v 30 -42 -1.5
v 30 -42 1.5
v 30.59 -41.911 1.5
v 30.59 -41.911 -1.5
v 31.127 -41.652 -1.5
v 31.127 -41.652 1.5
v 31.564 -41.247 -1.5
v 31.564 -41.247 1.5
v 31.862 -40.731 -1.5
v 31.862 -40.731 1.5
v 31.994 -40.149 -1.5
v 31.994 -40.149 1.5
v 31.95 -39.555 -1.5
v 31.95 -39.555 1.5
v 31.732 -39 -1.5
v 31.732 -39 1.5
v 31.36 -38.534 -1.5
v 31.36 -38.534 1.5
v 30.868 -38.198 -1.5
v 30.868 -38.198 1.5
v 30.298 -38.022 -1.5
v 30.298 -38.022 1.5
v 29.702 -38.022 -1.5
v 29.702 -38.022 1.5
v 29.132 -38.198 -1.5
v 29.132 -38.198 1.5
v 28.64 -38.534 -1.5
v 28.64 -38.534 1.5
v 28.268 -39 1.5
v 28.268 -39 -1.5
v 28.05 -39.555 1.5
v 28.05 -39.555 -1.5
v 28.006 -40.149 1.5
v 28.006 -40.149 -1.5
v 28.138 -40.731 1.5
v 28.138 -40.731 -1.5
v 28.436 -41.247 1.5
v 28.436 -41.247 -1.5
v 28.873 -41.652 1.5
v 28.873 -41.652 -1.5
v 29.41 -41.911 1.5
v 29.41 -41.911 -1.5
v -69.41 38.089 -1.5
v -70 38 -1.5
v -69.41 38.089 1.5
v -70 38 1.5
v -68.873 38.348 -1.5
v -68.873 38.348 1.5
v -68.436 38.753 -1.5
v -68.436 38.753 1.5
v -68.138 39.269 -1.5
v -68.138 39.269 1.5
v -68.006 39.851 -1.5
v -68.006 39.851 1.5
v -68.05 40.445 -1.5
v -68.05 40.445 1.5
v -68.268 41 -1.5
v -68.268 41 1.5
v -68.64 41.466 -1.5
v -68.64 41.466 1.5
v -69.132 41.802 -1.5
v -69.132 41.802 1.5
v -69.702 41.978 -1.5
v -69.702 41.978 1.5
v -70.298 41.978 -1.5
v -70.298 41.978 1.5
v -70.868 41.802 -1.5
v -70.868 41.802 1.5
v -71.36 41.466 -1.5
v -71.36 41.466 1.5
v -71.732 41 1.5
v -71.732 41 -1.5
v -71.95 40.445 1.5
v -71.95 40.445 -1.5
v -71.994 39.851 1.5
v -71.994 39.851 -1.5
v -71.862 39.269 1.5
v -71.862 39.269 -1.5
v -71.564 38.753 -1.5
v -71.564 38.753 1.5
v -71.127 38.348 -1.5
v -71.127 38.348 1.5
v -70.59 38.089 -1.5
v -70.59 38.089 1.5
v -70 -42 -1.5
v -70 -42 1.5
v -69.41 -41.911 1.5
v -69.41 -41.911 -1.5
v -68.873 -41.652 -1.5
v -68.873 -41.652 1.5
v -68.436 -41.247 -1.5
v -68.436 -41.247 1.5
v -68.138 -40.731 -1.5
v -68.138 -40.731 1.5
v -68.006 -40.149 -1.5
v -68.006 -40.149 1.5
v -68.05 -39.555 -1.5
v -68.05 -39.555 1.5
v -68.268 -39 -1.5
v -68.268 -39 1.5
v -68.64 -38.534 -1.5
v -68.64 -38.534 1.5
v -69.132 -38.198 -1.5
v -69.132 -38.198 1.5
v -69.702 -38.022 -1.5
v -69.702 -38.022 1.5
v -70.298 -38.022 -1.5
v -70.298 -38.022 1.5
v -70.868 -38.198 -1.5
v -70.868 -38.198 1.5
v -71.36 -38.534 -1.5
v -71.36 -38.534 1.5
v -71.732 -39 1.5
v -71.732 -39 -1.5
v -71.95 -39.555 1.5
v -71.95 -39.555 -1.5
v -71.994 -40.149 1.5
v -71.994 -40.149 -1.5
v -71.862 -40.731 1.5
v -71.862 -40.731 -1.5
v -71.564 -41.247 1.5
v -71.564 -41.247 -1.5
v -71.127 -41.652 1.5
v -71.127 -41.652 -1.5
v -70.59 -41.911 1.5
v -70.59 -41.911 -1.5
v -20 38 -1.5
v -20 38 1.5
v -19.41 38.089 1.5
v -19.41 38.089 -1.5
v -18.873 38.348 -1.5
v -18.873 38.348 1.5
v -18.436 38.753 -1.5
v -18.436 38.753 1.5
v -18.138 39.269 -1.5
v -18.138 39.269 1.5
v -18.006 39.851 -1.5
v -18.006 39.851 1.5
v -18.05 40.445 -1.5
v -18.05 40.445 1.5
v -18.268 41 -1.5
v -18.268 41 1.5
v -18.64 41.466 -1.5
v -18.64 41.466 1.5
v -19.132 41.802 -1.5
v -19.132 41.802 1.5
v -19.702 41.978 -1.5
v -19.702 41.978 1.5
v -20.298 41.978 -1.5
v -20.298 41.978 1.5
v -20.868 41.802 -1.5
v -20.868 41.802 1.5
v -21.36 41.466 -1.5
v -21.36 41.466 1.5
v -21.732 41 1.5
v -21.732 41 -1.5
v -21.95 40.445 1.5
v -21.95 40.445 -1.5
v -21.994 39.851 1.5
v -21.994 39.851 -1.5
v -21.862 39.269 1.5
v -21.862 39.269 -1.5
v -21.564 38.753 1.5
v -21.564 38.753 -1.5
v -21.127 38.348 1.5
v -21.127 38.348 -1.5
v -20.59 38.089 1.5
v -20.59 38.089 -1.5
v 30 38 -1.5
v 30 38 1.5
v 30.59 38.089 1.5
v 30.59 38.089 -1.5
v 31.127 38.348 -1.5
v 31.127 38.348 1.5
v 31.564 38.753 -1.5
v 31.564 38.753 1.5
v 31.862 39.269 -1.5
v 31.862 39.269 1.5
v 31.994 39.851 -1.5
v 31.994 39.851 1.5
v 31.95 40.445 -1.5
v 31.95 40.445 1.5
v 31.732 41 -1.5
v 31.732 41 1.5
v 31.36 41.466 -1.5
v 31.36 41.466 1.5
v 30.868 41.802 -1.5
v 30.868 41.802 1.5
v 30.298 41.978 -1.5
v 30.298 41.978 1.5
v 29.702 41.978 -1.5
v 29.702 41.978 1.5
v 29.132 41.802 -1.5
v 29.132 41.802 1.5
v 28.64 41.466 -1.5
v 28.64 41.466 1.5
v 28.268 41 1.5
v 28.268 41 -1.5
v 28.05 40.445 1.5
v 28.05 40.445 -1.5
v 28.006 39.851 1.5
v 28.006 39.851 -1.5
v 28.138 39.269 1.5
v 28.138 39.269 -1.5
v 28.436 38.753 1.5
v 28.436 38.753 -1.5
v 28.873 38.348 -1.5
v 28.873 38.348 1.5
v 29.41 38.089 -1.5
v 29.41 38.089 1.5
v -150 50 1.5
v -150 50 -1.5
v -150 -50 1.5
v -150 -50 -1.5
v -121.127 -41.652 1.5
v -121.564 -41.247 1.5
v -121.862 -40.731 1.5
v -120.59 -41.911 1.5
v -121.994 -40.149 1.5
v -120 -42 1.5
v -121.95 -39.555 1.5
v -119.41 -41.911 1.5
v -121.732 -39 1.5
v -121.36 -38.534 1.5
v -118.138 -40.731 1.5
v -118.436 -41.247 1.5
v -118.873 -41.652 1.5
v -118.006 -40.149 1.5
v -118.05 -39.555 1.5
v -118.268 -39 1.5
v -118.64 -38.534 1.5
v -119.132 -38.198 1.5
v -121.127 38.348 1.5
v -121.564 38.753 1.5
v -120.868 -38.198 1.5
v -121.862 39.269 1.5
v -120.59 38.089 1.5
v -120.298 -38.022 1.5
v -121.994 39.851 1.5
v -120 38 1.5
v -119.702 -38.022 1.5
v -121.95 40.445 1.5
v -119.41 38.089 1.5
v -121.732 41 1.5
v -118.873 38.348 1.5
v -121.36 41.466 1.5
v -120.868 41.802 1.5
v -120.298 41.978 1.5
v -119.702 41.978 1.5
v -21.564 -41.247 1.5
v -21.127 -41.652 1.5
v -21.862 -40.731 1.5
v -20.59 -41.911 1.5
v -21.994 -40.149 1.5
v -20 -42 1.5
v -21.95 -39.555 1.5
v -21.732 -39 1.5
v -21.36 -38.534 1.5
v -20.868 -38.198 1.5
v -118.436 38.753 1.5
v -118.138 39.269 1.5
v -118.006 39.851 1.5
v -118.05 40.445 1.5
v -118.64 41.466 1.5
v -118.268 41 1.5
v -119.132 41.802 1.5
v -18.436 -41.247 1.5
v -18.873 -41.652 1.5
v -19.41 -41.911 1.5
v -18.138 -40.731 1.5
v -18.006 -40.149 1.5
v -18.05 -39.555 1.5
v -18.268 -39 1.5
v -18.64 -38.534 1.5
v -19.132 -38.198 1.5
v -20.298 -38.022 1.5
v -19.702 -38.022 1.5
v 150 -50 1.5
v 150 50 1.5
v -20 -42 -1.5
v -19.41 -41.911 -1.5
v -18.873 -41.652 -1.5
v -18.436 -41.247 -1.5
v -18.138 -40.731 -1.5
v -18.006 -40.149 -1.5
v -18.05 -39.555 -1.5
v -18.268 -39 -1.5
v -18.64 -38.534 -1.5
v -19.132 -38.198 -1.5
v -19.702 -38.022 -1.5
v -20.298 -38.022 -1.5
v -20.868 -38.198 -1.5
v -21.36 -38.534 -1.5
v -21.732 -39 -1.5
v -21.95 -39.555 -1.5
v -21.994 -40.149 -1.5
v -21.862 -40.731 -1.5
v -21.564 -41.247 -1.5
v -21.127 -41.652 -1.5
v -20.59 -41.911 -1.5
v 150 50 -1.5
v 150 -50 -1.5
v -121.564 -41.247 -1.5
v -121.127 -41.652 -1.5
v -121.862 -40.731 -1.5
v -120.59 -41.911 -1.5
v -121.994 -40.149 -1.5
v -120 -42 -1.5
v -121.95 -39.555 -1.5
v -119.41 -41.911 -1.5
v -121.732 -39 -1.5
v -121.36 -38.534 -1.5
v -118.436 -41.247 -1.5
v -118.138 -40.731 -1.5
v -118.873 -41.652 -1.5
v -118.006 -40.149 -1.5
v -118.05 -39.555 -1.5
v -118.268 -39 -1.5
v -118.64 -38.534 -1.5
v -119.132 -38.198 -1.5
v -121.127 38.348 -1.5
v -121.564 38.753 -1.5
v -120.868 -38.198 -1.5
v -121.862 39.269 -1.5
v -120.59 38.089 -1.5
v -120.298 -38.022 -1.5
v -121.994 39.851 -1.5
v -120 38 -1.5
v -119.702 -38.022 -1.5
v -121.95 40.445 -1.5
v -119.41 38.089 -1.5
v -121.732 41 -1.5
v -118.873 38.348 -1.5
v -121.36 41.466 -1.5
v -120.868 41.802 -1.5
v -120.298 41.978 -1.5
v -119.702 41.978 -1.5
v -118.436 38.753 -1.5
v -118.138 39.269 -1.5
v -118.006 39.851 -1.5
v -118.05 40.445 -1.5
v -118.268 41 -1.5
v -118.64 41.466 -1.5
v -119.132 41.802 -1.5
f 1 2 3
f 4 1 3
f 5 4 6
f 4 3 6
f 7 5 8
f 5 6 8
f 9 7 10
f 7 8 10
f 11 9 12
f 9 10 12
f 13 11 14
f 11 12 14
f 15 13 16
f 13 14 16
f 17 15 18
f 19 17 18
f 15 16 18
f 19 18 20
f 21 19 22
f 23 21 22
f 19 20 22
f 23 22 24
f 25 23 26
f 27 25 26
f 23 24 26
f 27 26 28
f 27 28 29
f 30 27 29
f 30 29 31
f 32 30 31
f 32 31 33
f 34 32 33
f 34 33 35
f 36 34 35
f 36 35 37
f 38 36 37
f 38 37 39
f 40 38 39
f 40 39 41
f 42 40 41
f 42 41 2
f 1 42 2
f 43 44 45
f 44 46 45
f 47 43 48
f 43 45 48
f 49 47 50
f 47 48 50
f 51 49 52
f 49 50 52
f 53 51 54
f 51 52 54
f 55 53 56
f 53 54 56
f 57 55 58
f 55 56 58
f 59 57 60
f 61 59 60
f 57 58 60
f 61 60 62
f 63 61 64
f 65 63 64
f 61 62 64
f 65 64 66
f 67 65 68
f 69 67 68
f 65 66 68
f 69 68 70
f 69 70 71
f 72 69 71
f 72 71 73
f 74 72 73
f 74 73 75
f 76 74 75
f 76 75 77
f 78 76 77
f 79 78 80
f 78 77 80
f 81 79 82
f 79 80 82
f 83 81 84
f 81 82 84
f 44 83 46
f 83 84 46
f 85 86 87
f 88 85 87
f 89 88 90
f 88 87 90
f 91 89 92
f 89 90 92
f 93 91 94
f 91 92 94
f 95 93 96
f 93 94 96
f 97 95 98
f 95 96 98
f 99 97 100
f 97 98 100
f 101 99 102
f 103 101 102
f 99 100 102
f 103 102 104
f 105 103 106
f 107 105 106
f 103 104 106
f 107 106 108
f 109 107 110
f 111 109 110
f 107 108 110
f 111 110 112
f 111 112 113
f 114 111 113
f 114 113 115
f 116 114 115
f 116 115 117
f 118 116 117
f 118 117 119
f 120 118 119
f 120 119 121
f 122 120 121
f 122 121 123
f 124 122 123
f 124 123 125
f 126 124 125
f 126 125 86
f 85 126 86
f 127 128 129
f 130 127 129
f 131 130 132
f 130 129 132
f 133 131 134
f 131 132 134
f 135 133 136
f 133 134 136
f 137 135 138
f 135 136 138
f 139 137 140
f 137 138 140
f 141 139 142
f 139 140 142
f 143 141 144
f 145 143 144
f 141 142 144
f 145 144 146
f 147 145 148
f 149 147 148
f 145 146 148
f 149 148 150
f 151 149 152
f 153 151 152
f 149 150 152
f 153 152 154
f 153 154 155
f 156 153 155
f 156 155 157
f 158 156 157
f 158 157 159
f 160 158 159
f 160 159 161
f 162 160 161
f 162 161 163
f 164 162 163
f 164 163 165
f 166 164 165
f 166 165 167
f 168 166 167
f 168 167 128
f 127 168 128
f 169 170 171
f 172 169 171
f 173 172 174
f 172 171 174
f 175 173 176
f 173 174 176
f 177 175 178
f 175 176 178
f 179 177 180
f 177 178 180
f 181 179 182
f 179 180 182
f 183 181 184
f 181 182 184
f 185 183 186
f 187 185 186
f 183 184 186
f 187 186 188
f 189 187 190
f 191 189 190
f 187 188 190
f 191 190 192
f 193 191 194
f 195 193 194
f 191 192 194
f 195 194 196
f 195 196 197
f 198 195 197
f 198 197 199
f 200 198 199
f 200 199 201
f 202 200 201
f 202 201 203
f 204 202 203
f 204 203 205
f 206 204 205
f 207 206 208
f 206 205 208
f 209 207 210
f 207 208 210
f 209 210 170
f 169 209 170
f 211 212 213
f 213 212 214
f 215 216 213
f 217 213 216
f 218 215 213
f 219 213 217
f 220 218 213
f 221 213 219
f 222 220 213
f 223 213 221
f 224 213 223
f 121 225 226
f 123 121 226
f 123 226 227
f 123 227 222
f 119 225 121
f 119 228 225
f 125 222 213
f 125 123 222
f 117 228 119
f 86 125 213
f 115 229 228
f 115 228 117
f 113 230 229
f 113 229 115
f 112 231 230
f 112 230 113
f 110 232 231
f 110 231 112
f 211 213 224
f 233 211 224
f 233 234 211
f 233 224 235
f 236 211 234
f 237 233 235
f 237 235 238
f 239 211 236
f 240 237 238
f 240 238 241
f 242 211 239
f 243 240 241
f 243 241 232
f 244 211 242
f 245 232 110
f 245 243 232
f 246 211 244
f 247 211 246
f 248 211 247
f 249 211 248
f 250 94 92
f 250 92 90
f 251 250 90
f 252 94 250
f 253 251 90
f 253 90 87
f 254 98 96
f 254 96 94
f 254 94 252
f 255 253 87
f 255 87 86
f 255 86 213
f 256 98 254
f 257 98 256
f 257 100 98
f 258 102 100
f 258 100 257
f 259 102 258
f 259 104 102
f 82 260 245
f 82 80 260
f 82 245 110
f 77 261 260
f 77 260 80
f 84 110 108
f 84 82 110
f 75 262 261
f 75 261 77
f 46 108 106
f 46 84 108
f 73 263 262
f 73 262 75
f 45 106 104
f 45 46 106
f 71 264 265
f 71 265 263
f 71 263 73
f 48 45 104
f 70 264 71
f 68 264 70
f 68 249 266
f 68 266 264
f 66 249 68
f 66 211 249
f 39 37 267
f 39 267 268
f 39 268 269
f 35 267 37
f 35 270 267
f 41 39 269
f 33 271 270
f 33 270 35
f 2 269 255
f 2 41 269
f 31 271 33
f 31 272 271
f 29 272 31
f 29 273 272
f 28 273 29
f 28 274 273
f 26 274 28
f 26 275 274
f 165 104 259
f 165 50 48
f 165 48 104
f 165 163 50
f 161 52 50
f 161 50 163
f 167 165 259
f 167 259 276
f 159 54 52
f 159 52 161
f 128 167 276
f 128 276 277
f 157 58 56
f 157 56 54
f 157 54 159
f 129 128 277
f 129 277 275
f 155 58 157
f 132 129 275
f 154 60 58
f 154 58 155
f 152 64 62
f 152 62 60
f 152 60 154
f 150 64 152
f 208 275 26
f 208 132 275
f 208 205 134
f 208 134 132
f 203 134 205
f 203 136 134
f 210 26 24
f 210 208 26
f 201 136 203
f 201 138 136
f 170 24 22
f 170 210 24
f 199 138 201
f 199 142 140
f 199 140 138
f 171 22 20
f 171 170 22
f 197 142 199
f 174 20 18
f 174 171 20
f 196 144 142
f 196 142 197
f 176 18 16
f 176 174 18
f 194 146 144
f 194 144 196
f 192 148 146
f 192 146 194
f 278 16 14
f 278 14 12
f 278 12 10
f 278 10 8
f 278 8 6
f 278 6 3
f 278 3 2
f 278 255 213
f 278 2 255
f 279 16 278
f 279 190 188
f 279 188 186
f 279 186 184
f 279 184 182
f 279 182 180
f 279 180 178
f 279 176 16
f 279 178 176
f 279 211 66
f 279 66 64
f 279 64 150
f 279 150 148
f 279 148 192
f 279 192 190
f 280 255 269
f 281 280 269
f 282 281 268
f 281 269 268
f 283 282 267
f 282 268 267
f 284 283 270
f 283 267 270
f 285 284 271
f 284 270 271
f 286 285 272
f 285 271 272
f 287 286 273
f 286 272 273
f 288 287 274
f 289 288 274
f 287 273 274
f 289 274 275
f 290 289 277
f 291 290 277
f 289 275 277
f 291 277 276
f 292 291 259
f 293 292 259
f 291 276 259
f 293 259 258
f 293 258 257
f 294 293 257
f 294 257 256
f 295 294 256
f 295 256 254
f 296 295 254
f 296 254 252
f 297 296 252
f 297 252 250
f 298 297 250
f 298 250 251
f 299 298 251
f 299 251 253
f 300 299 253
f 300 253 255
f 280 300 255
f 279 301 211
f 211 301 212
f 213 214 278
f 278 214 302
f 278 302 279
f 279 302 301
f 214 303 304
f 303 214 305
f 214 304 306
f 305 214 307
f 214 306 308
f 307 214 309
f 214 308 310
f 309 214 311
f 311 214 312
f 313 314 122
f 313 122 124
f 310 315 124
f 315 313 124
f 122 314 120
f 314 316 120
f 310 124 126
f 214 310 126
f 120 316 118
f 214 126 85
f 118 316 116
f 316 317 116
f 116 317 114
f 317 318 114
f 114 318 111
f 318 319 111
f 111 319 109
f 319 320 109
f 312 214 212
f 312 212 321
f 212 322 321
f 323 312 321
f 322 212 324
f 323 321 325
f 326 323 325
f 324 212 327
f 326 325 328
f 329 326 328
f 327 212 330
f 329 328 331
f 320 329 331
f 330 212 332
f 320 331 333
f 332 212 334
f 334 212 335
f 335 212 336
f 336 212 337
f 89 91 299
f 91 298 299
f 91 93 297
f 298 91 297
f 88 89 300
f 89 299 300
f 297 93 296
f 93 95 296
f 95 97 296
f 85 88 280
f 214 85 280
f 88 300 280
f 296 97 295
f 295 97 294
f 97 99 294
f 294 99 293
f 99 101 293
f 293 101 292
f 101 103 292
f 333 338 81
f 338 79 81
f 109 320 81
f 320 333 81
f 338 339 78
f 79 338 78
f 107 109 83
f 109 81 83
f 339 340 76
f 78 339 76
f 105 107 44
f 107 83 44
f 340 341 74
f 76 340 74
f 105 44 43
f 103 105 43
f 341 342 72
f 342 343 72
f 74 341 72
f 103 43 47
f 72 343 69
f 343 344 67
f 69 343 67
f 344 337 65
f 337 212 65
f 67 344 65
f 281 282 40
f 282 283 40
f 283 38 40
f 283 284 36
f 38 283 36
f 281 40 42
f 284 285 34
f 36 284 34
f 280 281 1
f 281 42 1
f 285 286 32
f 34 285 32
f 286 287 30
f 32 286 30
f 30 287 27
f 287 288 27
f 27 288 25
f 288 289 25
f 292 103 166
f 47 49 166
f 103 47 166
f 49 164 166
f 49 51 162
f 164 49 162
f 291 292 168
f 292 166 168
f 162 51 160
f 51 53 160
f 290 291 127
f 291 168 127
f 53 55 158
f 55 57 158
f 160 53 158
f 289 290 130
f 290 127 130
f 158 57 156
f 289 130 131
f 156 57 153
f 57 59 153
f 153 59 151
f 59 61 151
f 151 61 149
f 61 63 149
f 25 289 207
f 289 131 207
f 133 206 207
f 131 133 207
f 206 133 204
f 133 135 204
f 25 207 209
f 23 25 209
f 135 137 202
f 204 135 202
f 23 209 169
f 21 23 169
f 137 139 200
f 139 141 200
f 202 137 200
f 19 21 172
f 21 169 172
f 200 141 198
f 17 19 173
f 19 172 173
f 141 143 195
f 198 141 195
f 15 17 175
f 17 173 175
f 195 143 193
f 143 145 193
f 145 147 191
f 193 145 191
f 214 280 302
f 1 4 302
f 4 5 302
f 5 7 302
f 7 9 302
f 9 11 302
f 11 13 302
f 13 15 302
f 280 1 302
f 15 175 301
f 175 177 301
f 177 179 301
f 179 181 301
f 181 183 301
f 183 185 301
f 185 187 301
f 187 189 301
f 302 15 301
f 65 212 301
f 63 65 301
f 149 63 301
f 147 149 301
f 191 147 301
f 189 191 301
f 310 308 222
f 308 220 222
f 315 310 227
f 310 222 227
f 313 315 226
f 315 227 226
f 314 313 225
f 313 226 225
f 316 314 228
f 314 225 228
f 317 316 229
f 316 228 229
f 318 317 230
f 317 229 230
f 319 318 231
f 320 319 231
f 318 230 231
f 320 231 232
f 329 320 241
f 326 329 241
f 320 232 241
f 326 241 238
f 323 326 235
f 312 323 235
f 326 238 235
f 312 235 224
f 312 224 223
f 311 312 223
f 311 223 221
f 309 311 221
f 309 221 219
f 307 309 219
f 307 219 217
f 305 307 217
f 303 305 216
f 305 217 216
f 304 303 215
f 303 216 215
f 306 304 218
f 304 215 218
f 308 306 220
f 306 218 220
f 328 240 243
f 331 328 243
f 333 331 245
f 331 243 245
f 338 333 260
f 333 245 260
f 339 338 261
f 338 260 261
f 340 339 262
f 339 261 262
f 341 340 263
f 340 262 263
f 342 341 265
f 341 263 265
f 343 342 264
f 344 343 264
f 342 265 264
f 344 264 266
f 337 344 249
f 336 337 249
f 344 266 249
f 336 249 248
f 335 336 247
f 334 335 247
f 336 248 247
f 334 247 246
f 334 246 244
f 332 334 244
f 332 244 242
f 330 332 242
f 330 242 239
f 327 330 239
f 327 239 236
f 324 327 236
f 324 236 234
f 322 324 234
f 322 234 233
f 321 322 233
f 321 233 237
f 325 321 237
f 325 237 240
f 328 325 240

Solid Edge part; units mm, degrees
sketch "Sketch1" plane through (0, 0, 0) normal (0, 0, 1) x (1, 0, 0)
  line L0 (-150, -50) -> (150, -50)
  line L1 (150, -50) -> (150, 50)
  line L2 (150, 50) -> (-150, 50)
  line L3 (-150, 50) -> (-150, -50)
  dimension "D1" = 100
  dimension "D2" = 300
extrude "Protrusion1" add sketch "Sketch1" along normal mid plane 3
hole "controller_holes" at (-120, 40, 1.5) direction (0, 0, -1) diameter 4 end up to next
pattern_linear "Pattern1" count 4 spacing 50 along (1, 0, 0) count 2 spacing 80 along (0, -1, 0) of "controller_holes"
properties material "St3ps GOST 380-94"
